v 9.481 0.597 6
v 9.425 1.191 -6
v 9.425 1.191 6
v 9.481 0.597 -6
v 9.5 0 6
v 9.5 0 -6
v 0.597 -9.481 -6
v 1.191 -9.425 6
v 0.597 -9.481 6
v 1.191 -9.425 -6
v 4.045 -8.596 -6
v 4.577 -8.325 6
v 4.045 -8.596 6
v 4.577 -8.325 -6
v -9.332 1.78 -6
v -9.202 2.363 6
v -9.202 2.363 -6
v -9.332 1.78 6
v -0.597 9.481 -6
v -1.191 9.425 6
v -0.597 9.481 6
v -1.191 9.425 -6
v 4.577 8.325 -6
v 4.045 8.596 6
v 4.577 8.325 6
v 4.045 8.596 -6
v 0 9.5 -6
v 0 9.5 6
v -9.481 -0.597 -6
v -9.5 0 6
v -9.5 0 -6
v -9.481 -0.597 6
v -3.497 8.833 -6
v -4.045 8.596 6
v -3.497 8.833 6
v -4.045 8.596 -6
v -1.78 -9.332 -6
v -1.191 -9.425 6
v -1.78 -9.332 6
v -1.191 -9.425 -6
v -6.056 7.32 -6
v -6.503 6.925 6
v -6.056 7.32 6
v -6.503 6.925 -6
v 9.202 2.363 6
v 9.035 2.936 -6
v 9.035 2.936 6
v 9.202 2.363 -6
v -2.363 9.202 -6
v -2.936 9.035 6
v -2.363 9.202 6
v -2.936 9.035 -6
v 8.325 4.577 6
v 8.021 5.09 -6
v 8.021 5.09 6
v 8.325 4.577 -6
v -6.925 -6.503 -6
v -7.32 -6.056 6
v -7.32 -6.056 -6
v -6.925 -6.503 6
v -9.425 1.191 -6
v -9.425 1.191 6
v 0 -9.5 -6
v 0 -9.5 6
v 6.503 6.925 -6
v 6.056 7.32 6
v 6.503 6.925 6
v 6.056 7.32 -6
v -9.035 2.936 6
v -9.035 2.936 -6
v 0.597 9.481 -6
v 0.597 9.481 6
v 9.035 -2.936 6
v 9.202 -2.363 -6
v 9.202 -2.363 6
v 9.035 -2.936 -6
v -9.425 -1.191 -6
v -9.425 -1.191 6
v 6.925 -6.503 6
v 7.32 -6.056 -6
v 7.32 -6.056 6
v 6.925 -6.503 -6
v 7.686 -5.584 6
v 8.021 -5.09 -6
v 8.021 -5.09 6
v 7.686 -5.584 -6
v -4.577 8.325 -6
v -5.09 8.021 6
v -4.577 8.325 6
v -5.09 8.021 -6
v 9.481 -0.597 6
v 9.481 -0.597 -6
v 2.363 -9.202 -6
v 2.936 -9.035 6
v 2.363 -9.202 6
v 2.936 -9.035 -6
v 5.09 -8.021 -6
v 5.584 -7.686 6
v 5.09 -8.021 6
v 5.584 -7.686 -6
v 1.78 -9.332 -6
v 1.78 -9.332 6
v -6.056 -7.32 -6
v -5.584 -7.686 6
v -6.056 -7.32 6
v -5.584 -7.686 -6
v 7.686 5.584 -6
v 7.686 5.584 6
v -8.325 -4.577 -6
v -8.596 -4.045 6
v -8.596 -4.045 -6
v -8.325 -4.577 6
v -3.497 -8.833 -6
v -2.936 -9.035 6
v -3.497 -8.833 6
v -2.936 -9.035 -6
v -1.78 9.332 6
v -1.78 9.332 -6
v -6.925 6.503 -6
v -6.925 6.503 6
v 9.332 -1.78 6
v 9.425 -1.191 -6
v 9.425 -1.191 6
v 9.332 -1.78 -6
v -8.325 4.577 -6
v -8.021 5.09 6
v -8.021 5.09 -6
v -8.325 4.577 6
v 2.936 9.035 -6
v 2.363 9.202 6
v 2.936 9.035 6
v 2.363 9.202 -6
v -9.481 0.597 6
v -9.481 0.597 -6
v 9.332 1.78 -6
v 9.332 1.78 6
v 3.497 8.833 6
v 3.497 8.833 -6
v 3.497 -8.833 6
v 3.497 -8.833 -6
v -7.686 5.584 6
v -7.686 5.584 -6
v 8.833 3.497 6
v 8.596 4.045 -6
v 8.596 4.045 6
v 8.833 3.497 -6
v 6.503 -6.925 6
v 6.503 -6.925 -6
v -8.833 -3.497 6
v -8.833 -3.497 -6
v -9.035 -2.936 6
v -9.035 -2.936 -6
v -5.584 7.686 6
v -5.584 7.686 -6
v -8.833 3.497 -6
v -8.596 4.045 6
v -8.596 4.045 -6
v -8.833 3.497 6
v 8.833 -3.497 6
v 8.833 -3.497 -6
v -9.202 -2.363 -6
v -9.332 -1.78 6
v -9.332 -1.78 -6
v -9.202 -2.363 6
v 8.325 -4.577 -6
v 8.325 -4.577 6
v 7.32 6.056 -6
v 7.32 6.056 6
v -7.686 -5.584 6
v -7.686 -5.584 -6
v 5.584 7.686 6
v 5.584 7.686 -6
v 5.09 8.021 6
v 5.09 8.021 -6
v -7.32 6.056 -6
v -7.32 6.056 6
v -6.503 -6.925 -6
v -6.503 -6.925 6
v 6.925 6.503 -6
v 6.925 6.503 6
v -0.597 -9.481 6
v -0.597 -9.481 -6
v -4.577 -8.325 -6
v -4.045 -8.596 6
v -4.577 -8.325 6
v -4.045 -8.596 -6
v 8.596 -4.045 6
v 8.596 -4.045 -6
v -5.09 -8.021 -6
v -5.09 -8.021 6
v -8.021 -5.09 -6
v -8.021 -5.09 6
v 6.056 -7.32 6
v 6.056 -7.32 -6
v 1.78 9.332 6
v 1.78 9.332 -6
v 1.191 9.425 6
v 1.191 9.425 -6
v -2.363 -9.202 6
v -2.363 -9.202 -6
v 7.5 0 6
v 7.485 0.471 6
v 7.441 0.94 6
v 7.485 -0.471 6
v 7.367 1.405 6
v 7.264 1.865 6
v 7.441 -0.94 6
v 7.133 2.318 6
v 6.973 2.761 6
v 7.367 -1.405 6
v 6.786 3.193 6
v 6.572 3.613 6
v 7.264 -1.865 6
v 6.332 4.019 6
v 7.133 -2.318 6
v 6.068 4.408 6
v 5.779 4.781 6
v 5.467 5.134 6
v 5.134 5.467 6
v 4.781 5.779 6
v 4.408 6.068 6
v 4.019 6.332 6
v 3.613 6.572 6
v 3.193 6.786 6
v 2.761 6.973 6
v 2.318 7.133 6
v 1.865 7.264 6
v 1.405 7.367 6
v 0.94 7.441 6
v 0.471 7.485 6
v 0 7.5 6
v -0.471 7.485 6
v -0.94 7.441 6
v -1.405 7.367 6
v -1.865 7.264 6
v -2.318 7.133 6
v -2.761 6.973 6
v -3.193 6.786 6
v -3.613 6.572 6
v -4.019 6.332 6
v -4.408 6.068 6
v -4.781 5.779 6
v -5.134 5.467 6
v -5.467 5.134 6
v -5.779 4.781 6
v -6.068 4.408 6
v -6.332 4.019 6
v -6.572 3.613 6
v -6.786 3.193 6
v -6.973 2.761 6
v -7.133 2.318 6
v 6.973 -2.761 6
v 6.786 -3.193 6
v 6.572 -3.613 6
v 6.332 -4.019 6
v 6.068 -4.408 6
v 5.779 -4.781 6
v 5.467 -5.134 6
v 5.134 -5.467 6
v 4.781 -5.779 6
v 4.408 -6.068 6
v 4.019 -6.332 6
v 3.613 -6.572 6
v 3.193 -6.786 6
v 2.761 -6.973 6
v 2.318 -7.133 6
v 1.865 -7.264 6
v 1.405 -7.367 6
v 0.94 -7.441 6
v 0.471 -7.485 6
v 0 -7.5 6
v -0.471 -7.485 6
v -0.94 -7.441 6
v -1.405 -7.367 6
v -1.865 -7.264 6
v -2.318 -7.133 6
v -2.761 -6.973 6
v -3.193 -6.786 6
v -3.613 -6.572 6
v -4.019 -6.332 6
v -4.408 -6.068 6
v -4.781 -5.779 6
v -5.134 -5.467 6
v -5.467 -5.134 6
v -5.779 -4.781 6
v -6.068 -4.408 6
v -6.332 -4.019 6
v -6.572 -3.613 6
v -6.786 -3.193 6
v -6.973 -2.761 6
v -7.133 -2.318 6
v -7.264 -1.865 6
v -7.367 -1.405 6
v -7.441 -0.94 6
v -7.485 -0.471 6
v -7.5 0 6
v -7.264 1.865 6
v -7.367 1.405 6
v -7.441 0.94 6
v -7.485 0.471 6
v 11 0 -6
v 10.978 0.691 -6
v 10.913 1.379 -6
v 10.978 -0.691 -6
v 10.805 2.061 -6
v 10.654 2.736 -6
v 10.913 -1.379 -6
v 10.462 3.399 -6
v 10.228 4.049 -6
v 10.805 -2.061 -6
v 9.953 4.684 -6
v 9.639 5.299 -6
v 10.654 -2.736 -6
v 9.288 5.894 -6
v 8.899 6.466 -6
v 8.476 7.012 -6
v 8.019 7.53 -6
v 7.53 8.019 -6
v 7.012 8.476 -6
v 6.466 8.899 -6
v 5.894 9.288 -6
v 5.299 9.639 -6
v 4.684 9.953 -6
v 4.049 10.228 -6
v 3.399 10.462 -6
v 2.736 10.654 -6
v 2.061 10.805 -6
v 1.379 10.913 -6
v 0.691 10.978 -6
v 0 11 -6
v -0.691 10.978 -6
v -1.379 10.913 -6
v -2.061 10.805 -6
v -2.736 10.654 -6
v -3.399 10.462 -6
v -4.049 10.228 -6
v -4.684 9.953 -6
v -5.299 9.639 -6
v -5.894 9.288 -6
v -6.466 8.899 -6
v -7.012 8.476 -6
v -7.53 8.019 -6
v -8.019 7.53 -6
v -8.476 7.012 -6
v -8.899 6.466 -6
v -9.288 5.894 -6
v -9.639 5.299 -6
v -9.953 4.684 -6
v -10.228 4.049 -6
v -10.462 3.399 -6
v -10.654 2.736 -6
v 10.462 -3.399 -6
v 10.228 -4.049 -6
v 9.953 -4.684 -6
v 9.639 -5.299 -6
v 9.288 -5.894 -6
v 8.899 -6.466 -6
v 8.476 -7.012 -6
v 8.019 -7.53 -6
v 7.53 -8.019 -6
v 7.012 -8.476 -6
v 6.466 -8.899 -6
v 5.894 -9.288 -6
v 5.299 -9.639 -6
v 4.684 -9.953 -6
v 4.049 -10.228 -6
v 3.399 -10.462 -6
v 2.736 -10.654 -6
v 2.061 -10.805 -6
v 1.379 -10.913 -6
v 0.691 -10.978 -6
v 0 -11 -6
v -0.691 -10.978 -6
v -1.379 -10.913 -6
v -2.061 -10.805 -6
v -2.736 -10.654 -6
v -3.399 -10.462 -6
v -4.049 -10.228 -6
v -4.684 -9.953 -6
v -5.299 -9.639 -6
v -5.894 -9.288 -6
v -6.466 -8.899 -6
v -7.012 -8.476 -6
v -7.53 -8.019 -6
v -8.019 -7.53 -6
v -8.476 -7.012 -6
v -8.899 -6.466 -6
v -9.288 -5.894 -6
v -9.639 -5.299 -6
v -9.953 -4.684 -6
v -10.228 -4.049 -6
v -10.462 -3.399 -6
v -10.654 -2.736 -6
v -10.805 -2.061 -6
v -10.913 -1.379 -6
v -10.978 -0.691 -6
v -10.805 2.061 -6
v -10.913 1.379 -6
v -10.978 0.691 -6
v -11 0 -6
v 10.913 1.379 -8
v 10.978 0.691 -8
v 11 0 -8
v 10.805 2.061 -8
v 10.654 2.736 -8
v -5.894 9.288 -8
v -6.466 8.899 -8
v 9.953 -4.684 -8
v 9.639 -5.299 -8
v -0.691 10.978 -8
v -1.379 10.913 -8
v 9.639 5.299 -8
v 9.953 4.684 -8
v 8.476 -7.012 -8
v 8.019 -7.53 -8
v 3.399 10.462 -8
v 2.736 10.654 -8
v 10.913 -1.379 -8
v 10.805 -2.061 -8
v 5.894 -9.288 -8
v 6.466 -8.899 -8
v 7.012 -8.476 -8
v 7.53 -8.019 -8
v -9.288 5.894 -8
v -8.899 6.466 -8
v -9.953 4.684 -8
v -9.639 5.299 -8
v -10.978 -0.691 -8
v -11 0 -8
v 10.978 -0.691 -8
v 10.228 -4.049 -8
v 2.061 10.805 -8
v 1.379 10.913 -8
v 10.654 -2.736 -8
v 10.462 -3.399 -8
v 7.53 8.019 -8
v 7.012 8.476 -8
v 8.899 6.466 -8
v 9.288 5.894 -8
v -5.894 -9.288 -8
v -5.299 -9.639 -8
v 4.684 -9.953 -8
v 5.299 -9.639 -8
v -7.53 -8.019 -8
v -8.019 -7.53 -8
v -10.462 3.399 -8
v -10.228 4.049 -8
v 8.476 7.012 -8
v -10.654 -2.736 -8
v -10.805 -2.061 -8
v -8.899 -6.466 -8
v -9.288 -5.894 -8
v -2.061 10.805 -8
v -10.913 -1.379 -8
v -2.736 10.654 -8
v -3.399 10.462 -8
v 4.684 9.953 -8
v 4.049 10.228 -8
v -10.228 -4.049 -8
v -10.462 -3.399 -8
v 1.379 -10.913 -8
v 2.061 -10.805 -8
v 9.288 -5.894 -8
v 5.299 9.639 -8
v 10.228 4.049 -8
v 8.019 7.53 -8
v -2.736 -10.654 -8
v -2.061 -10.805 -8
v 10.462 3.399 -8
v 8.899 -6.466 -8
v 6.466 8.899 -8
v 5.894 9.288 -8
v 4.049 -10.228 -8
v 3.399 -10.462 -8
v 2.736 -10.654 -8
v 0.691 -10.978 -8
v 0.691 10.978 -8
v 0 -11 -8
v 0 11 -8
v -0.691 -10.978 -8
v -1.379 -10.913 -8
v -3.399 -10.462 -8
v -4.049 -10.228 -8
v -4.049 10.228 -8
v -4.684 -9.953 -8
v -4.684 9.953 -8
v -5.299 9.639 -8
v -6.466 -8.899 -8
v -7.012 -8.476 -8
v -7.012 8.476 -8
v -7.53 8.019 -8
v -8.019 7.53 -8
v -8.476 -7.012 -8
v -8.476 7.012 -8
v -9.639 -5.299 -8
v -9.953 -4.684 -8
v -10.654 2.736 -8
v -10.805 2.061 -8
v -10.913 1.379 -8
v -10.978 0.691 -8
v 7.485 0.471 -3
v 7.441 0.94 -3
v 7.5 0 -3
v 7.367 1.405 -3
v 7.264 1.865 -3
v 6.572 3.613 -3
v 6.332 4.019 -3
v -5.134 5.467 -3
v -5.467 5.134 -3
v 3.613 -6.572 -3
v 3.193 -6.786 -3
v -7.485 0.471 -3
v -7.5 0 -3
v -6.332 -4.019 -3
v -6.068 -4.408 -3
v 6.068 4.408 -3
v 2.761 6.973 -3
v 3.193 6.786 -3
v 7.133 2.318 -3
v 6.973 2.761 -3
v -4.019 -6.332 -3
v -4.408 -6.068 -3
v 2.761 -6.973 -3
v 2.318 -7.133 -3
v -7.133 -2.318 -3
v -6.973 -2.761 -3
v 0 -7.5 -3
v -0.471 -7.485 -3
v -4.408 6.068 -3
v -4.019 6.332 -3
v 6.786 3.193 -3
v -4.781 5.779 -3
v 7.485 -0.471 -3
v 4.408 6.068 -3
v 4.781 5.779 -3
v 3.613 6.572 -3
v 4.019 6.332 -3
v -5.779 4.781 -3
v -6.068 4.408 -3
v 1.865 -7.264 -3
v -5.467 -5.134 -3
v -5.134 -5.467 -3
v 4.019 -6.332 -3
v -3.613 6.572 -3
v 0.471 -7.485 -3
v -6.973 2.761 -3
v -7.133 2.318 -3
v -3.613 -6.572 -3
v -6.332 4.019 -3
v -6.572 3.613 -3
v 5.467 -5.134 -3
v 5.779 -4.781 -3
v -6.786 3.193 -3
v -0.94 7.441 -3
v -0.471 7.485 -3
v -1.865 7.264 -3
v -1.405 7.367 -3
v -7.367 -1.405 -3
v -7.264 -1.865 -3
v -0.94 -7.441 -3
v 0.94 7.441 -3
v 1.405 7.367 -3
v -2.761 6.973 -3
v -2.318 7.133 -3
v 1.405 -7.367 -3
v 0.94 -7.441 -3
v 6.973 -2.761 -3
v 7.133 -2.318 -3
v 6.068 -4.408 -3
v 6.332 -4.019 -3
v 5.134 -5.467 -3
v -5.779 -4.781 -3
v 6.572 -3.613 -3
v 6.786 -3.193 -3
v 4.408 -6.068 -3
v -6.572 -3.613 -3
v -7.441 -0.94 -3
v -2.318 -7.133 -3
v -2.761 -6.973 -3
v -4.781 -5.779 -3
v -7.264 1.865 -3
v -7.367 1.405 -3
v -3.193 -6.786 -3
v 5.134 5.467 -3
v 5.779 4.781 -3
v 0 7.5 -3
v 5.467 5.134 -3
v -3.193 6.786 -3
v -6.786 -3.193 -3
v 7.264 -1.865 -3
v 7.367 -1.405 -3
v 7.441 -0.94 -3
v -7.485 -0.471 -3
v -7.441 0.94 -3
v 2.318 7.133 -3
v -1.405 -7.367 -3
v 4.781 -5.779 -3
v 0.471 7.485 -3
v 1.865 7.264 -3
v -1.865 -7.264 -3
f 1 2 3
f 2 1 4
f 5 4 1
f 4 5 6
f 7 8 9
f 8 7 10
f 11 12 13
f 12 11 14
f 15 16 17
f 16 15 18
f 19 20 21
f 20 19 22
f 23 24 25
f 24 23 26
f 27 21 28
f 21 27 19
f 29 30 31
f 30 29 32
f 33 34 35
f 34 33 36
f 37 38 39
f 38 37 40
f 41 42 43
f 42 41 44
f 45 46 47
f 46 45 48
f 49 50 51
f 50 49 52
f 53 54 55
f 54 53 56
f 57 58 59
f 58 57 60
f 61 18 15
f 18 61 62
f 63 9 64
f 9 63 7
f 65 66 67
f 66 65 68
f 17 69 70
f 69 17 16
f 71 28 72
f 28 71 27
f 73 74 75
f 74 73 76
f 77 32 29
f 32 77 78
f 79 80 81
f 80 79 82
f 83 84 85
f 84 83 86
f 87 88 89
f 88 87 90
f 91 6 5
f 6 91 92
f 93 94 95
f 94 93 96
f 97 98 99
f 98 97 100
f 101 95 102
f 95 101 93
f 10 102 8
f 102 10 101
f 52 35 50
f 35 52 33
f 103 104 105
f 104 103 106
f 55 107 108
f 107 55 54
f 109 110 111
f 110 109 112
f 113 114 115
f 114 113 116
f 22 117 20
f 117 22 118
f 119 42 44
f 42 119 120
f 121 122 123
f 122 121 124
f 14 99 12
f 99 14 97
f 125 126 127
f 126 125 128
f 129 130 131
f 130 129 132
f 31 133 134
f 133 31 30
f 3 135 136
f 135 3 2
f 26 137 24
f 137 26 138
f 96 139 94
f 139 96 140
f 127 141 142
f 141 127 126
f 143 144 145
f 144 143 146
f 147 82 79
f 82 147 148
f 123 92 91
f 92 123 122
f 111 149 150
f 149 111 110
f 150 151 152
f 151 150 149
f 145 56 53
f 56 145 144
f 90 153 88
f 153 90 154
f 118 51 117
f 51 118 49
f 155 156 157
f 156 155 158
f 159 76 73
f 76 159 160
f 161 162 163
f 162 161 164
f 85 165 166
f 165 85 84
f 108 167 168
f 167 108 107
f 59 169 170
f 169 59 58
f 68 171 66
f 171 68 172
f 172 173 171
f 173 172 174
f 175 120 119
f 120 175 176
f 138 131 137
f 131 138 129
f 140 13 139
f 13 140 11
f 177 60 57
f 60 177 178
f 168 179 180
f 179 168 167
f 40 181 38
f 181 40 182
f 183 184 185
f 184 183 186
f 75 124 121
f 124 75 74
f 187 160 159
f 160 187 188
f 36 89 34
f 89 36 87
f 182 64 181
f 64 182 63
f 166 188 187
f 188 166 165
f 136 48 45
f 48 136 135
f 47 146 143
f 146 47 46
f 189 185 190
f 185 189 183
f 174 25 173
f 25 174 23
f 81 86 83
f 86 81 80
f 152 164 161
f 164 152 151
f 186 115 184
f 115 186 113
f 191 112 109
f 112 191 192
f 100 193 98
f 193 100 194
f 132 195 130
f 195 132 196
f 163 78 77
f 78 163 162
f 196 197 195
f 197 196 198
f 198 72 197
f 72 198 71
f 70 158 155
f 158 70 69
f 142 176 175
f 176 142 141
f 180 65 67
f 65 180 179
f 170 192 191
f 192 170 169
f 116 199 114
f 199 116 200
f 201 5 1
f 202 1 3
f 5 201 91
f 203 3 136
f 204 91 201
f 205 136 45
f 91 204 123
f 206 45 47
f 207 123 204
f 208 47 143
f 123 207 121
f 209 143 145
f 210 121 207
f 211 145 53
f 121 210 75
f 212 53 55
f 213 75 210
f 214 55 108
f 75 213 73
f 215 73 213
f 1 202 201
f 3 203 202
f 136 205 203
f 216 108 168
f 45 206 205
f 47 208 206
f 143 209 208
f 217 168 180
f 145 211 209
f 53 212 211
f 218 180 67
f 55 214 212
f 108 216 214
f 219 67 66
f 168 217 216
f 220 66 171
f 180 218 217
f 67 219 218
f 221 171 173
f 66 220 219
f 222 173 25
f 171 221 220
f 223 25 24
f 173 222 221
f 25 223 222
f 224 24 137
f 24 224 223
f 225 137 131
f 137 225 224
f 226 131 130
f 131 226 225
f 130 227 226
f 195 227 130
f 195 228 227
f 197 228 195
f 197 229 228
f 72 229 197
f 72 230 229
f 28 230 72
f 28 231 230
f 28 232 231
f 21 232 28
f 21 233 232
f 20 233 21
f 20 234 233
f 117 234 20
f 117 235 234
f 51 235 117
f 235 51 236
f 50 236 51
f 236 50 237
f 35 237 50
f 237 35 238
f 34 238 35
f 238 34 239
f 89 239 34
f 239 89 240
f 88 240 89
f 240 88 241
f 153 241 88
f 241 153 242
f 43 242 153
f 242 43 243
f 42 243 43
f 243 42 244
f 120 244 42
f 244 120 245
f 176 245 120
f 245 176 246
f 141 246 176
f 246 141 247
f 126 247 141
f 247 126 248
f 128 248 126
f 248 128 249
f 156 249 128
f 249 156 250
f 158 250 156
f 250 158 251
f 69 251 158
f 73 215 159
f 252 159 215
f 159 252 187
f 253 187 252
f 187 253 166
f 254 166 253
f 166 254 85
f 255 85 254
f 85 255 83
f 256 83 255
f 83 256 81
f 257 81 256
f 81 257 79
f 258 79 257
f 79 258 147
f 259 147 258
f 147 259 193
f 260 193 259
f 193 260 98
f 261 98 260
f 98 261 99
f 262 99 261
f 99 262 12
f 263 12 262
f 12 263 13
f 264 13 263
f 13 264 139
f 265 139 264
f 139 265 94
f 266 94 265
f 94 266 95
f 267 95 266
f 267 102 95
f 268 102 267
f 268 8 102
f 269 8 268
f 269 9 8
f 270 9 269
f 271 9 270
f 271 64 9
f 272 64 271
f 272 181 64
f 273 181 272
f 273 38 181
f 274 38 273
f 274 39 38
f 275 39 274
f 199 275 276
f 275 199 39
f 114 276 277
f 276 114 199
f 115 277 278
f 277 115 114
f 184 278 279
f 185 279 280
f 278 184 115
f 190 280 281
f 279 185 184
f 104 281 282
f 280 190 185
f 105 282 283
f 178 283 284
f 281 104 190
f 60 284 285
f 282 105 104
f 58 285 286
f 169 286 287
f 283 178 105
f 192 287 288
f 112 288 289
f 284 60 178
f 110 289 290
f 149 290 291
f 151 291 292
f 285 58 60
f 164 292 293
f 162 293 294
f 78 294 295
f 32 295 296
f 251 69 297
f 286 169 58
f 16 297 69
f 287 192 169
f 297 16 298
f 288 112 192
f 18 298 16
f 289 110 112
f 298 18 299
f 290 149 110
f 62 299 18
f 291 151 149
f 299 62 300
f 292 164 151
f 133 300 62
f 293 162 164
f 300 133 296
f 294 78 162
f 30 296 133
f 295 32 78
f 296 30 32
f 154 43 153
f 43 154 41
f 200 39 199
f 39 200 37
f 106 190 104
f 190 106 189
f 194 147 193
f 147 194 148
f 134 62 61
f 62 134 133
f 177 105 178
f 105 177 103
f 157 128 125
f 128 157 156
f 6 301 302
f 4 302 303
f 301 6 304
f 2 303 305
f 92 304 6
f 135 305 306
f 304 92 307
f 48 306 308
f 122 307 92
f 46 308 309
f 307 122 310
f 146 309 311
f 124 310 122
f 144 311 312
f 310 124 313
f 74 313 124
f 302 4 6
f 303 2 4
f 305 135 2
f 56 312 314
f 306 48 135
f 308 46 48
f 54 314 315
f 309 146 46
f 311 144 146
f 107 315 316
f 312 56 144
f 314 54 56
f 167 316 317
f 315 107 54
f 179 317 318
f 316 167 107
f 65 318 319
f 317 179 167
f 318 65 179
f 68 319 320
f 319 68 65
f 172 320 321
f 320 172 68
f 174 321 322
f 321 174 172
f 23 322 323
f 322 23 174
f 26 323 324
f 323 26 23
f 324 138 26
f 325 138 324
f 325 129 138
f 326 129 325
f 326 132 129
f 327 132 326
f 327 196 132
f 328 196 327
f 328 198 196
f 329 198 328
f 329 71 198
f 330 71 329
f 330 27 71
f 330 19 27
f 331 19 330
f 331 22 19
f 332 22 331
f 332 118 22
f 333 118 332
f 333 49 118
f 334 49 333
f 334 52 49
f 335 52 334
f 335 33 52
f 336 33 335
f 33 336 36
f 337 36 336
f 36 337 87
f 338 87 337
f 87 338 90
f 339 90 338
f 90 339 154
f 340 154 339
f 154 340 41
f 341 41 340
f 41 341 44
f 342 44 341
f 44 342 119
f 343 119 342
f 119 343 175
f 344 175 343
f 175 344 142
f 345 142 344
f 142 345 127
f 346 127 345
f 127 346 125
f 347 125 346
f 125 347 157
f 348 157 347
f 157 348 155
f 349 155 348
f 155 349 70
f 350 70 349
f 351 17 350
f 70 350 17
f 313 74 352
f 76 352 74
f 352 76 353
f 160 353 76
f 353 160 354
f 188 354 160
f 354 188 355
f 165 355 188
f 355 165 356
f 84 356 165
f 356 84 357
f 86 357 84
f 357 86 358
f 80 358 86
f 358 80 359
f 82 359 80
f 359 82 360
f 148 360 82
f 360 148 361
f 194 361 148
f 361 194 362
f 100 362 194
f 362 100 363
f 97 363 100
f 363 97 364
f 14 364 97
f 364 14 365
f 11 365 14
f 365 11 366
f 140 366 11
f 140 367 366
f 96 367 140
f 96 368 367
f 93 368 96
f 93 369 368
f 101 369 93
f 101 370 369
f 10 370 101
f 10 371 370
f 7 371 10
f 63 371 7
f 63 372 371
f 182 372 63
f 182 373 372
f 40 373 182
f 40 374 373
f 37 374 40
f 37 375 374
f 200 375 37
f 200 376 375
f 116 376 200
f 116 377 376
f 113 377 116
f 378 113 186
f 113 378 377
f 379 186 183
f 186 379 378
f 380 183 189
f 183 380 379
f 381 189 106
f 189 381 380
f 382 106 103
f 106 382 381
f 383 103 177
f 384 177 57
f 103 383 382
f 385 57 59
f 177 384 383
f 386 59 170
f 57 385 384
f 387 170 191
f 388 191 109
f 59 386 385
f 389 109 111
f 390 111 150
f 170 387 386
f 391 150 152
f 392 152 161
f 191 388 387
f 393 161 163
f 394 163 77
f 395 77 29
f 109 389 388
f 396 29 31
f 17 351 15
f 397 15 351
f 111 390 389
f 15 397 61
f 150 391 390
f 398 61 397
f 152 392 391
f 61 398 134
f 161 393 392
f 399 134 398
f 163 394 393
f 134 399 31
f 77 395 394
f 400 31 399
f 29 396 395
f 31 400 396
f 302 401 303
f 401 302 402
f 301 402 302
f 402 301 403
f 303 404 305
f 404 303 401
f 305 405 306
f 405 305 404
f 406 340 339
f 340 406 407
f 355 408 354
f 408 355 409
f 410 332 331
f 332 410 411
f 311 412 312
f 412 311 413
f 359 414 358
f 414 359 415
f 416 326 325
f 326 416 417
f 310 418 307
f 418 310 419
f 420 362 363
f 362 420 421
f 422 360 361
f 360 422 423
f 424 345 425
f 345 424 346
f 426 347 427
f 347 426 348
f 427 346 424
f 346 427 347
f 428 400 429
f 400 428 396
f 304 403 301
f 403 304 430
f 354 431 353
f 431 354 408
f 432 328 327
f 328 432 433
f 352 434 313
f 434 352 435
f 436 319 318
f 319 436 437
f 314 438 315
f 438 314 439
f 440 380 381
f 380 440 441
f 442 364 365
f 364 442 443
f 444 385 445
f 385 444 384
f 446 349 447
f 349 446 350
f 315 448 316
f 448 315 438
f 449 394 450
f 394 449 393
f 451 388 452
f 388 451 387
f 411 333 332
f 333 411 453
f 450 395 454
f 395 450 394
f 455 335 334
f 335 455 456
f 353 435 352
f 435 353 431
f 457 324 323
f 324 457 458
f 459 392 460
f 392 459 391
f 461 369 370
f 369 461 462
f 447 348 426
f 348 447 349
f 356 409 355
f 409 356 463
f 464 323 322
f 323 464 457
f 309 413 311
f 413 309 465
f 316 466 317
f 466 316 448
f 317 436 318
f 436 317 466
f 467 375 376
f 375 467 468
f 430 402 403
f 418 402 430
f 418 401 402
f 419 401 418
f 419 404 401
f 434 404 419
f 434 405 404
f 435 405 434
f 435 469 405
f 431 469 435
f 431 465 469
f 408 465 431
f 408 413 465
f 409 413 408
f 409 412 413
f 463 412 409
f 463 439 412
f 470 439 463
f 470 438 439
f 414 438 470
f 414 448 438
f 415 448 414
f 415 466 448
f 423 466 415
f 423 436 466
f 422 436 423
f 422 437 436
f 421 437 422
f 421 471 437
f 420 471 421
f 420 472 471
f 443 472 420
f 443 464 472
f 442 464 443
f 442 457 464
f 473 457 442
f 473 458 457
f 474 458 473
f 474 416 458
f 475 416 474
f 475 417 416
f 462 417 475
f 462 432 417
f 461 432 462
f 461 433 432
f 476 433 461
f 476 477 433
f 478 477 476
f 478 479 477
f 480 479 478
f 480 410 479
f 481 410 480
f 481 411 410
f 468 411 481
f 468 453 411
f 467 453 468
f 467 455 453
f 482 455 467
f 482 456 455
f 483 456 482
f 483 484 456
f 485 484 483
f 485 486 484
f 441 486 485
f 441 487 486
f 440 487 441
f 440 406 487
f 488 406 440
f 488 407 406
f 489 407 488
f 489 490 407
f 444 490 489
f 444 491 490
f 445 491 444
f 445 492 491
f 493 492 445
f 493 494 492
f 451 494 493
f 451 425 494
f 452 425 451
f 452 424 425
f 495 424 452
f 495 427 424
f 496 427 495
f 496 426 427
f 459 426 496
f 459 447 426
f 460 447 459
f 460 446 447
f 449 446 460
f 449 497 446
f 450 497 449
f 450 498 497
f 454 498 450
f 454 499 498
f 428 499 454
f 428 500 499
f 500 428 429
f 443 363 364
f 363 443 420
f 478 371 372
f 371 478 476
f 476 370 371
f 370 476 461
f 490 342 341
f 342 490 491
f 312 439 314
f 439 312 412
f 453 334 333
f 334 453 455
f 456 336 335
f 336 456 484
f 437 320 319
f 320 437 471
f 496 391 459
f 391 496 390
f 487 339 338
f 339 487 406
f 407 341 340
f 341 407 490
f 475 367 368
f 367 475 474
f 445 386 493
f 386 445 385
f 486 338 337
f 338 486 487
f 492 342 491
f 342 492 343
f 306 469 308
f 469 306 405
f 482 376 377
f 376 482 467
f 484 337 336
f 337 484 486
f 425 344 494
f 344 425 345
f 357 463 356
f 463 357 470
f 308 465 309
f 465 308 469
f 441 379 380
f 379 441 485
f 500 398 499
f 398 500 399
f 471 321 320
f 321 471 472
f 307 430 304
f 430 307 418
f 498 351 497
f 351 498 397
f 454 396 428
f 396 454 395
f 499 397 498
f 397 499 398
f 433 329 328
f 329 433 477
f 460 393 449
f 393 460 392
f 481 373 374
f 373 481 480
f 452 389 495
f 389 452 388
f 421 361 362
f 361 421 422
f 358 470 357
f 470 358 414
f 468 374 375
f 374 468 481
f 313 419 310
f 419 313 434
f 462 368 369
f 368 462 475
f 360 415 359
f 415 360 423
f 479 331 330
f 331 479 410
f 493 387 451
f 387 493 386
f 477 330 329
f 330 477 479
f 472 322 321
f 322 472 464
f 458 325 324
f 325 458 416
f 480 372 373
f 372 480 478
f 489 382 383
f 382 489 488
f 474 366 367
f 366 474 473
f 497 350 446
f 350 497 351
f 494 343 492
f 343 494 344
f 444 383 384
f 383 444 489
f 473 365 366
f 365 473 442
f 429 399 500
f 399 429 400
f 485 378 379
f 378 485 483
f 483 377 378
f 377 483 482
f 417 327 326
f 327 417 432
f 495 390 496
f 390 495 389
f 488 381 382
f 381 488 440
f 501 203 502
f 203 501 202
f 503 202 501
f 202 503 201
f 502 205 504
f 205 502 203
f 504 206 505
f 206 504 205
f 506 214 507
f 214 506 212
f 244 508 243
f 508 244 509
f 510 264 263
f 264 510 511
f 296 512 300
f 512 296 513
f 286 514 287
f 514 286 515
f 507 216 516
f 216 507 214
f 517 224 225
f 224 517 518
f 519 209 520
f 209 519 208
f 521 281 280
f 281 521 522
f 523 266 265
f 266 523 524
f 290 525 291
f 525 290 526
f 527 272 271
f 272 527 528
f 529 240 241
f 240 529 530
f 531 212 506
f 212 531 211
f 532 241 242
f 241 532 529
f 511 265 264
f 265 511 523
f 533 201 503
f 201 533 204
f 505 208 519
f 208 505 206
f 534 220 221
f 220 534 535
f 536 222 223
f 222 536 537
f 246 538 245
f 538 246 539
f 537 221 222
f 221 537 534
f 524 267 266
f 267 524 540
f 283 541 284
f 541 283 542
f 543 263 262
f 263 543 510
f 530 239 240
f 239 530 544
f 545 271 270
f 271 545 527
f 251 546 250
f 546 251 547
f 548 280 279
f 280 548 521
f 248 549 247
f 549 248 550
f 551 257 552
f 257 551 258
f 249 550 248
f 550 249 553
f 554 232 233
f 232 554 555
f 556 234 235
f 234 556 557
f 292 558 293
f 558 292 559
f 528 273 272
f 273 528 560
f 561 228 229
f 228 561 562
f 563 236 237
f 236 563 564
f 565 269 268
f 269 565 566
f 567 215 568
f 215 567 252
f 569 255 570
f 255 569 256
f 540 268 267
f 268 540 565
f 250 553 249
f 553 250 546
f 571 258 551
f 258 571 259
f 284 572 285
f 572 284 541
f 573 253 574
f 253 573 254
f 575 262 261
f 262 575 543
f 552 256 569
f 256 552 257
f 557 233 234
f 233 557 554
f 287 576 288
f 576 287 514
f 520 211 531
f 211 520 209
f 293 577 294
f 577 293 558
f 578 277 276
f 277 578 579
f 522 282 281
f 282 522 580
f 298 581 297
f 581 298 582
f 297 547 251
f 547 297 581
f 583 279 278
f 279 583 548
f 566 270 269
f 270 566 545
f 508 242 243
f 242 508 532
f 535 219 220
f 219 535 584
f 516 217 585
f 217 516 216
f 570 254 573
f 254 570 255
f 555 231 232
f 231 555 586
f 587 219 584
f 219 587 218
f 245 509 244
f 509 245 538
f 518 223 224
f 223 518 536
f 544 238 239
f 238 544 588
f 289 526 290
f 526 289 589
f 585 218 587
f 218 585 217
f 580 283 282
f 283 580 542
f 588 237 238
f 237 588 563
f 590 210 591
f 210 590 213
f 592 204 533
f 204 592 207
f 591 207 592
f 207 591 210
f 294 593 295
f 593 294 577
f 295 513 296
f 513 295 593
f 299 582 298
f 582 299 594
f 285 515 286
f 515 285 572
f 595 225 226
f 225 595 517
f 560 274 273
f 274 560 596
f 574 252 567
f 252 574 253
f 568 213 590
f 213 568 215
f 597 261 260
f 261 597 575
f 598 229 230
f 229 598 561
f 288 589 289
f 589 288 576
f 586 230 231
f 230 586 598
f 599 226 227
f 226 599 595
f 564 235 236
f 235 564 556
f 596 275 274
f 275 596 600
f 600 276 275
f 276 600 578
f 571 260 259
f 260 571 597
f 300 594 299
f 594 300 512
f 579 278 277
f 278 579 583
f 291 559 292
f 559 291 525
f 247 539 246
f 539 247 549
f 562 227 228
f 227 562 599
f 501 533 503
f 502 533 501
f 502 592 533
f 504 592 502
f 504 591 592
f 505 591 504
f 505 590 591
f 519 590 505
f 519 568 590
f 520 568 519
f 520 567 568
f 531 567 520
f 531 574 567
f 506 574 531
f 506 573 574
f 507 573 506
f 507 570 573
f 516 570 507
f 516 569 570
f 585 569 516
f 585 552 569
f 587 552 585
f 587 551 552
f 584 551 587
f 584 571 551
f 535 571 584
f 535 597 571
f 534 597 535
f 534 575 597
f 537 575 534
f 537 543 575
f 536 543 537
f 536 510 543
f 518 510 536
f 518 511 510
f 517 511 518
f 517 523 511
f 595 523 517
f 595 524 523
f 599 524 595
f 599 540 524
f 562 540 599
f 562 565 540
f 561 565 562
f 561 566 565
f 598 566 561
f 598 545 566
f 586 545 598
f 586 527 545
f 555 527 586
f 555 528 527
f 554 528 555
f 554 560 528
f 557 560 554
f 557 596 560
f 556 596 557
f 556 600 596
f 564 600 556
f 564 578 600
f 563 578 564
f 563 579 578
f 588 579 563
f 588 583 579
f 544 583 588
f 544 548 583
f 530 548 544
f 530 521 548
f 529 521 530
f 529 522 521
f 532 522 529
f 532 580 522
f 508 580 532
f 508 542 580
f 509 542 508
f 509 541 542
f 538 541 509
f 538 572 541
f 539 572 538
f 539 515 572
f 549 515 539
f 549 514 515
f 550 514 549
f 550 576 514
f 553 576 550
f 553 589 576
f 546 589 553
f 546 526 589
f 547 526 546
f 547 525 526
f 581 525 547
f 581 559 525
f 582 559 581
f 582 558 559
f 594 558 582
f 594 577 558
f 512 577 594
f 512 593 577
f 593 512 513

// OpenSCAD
$fn=100;

id=19;
od=22;
wide=4/2;
height=12;
difference(){
    union(){
        cylinder(h = height, r=id/2, center = true);
        translate([0,0,-height/2-wide/2]) cylinder(h = wide, r=od/2, center = true);
    }
    translate([0,0,wide]) cylinder(h = height-wide, r=(id/2)-2, center = true);
}
